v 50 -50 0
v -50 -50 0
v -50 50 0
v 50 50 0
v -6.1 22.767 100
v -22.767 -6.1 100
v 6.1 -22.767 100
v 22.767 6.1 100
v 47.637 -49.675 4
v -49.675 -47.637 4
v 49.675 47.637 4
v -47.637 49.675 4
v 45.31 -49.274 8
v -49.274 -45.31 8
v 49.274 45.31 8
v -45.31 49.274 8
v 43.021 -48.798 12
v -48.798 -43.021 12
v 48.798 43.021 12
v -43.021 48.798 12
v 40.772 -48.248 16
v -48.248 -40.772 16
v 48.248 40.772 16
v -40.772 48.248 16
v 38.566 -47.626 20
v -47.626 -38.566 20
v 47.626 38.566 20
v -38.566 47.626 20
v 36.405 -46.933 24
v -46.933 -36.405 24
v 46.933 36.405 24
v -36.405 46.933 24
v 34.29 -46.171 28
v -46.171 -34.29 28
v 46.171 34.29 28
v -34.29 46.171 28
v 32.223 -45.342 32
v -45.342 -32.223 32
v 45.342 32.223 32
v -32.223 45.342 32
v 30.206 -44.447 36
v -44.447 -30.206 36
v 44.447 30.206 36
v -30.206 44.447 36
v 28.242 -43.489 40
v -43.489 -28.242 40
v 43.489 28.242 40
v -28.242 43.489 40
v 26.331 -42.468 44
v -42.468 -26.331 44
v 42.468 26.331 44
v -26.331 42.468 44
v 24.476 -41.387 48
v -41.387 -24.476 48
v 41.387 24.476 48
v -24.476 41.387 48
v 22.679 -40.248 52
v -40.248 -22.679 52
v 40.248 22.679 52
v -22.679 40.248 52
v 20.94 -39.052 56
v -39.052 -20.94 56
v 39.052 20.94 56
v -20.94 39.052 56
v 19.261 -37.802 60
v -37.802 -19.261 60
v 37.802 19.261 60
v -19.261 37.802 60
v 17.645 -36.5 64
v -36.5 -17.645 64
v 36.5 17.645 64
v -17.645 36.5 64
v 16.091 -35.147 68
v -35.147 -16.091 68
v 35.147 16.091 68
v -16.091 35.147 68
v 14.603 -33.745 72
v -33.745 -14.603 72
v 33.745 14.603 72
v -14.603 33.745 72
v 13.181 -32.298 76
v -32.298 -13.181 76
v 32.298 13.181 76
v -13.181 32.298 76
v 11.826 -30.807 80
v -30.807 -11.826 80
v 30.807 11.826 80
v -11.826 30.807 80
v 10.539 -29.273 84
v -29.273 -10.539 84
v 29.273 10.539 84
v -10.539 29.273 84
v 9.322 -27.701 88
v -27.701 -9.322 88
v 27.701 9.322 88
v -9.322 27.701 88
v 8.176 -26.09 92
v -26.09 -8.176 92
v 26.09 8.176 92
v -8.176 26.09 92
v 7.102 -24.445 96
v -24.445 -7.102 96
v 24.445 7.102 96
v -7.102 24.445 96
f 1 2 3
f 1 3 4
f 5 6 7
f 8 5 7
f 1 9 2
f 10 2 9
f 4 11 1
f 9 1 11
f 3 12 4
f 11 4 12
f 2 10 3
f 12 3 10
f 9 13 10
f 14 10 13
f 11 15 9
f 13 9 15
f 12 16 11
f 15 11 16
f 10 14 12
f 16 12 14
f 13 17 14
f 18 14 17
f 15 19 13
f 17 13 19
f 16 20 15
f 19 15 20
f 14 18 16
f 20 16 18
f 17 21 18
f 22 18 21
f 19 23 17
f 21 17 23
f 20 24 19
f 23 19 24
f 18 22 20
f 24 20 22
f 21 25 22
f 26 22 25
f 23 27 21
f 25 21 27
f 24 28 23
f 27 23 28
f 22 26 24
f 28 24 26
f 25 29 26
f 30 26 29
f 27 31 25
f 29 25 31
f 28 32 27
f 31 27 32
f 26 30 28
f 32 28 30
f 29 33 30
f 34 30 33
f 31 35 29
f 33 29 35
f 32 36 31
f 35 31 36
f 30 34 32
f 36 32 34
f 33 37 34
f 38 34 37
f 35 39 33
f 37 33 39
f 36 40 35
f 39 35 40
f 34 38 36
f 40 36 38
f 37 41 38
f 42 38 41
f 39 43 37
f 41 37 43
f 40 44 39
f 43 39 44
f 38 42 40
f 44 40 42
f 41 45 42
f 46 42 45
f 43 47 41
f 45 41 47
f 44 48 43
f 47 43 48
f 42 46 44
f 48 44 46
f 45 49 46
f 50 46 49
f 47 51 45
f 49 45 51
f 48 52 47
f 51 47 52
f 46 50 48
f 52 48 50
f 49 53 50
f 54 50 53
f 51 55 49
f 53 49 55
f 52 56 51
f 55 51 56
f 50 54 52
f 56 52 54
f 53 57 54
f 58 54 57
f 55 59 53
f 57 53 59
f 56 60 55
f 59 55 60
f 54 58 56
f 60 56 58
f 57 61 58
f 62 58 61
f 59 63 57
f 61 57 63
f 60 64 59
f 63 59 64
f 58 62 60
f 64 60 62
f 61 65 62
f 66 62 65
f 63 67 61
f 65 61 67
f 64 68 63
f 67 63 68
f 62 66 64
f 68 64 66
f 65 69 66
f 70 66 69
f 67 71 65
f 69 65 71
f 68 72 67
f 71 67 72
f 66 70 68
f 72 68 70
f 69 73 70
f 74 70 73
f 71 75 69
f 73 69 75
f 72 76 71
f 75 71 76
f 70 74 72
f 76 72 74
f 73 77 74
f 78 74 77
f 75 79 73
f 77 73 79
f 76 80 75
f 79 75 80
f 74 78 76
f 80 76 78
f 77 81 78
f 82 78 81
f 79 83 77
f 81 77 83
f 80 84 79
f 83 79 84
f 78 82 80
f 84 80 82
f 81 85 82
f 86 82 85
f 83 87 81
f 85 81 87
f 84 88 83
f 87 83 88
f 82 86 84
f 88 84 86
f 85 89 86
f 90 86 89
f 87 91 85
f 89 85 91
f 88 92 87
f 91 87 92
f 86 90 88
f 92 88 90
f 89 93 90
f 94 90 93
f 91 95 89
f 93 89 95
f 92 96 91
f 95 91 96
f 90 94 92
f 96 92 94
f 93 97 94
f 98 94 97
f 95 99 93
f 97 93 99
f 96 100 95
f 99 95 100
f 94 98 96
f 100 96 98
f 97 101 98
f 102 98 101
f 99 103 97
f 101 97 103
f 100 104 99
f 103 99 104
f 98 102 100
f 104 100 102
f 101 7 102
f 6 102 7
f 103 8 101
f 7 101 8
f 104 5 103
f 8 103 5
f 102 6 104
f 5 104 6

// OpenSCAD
linear_extrude(100, twist=30, slices=25, scale=1/3) {
  square(100, center=true);
}
